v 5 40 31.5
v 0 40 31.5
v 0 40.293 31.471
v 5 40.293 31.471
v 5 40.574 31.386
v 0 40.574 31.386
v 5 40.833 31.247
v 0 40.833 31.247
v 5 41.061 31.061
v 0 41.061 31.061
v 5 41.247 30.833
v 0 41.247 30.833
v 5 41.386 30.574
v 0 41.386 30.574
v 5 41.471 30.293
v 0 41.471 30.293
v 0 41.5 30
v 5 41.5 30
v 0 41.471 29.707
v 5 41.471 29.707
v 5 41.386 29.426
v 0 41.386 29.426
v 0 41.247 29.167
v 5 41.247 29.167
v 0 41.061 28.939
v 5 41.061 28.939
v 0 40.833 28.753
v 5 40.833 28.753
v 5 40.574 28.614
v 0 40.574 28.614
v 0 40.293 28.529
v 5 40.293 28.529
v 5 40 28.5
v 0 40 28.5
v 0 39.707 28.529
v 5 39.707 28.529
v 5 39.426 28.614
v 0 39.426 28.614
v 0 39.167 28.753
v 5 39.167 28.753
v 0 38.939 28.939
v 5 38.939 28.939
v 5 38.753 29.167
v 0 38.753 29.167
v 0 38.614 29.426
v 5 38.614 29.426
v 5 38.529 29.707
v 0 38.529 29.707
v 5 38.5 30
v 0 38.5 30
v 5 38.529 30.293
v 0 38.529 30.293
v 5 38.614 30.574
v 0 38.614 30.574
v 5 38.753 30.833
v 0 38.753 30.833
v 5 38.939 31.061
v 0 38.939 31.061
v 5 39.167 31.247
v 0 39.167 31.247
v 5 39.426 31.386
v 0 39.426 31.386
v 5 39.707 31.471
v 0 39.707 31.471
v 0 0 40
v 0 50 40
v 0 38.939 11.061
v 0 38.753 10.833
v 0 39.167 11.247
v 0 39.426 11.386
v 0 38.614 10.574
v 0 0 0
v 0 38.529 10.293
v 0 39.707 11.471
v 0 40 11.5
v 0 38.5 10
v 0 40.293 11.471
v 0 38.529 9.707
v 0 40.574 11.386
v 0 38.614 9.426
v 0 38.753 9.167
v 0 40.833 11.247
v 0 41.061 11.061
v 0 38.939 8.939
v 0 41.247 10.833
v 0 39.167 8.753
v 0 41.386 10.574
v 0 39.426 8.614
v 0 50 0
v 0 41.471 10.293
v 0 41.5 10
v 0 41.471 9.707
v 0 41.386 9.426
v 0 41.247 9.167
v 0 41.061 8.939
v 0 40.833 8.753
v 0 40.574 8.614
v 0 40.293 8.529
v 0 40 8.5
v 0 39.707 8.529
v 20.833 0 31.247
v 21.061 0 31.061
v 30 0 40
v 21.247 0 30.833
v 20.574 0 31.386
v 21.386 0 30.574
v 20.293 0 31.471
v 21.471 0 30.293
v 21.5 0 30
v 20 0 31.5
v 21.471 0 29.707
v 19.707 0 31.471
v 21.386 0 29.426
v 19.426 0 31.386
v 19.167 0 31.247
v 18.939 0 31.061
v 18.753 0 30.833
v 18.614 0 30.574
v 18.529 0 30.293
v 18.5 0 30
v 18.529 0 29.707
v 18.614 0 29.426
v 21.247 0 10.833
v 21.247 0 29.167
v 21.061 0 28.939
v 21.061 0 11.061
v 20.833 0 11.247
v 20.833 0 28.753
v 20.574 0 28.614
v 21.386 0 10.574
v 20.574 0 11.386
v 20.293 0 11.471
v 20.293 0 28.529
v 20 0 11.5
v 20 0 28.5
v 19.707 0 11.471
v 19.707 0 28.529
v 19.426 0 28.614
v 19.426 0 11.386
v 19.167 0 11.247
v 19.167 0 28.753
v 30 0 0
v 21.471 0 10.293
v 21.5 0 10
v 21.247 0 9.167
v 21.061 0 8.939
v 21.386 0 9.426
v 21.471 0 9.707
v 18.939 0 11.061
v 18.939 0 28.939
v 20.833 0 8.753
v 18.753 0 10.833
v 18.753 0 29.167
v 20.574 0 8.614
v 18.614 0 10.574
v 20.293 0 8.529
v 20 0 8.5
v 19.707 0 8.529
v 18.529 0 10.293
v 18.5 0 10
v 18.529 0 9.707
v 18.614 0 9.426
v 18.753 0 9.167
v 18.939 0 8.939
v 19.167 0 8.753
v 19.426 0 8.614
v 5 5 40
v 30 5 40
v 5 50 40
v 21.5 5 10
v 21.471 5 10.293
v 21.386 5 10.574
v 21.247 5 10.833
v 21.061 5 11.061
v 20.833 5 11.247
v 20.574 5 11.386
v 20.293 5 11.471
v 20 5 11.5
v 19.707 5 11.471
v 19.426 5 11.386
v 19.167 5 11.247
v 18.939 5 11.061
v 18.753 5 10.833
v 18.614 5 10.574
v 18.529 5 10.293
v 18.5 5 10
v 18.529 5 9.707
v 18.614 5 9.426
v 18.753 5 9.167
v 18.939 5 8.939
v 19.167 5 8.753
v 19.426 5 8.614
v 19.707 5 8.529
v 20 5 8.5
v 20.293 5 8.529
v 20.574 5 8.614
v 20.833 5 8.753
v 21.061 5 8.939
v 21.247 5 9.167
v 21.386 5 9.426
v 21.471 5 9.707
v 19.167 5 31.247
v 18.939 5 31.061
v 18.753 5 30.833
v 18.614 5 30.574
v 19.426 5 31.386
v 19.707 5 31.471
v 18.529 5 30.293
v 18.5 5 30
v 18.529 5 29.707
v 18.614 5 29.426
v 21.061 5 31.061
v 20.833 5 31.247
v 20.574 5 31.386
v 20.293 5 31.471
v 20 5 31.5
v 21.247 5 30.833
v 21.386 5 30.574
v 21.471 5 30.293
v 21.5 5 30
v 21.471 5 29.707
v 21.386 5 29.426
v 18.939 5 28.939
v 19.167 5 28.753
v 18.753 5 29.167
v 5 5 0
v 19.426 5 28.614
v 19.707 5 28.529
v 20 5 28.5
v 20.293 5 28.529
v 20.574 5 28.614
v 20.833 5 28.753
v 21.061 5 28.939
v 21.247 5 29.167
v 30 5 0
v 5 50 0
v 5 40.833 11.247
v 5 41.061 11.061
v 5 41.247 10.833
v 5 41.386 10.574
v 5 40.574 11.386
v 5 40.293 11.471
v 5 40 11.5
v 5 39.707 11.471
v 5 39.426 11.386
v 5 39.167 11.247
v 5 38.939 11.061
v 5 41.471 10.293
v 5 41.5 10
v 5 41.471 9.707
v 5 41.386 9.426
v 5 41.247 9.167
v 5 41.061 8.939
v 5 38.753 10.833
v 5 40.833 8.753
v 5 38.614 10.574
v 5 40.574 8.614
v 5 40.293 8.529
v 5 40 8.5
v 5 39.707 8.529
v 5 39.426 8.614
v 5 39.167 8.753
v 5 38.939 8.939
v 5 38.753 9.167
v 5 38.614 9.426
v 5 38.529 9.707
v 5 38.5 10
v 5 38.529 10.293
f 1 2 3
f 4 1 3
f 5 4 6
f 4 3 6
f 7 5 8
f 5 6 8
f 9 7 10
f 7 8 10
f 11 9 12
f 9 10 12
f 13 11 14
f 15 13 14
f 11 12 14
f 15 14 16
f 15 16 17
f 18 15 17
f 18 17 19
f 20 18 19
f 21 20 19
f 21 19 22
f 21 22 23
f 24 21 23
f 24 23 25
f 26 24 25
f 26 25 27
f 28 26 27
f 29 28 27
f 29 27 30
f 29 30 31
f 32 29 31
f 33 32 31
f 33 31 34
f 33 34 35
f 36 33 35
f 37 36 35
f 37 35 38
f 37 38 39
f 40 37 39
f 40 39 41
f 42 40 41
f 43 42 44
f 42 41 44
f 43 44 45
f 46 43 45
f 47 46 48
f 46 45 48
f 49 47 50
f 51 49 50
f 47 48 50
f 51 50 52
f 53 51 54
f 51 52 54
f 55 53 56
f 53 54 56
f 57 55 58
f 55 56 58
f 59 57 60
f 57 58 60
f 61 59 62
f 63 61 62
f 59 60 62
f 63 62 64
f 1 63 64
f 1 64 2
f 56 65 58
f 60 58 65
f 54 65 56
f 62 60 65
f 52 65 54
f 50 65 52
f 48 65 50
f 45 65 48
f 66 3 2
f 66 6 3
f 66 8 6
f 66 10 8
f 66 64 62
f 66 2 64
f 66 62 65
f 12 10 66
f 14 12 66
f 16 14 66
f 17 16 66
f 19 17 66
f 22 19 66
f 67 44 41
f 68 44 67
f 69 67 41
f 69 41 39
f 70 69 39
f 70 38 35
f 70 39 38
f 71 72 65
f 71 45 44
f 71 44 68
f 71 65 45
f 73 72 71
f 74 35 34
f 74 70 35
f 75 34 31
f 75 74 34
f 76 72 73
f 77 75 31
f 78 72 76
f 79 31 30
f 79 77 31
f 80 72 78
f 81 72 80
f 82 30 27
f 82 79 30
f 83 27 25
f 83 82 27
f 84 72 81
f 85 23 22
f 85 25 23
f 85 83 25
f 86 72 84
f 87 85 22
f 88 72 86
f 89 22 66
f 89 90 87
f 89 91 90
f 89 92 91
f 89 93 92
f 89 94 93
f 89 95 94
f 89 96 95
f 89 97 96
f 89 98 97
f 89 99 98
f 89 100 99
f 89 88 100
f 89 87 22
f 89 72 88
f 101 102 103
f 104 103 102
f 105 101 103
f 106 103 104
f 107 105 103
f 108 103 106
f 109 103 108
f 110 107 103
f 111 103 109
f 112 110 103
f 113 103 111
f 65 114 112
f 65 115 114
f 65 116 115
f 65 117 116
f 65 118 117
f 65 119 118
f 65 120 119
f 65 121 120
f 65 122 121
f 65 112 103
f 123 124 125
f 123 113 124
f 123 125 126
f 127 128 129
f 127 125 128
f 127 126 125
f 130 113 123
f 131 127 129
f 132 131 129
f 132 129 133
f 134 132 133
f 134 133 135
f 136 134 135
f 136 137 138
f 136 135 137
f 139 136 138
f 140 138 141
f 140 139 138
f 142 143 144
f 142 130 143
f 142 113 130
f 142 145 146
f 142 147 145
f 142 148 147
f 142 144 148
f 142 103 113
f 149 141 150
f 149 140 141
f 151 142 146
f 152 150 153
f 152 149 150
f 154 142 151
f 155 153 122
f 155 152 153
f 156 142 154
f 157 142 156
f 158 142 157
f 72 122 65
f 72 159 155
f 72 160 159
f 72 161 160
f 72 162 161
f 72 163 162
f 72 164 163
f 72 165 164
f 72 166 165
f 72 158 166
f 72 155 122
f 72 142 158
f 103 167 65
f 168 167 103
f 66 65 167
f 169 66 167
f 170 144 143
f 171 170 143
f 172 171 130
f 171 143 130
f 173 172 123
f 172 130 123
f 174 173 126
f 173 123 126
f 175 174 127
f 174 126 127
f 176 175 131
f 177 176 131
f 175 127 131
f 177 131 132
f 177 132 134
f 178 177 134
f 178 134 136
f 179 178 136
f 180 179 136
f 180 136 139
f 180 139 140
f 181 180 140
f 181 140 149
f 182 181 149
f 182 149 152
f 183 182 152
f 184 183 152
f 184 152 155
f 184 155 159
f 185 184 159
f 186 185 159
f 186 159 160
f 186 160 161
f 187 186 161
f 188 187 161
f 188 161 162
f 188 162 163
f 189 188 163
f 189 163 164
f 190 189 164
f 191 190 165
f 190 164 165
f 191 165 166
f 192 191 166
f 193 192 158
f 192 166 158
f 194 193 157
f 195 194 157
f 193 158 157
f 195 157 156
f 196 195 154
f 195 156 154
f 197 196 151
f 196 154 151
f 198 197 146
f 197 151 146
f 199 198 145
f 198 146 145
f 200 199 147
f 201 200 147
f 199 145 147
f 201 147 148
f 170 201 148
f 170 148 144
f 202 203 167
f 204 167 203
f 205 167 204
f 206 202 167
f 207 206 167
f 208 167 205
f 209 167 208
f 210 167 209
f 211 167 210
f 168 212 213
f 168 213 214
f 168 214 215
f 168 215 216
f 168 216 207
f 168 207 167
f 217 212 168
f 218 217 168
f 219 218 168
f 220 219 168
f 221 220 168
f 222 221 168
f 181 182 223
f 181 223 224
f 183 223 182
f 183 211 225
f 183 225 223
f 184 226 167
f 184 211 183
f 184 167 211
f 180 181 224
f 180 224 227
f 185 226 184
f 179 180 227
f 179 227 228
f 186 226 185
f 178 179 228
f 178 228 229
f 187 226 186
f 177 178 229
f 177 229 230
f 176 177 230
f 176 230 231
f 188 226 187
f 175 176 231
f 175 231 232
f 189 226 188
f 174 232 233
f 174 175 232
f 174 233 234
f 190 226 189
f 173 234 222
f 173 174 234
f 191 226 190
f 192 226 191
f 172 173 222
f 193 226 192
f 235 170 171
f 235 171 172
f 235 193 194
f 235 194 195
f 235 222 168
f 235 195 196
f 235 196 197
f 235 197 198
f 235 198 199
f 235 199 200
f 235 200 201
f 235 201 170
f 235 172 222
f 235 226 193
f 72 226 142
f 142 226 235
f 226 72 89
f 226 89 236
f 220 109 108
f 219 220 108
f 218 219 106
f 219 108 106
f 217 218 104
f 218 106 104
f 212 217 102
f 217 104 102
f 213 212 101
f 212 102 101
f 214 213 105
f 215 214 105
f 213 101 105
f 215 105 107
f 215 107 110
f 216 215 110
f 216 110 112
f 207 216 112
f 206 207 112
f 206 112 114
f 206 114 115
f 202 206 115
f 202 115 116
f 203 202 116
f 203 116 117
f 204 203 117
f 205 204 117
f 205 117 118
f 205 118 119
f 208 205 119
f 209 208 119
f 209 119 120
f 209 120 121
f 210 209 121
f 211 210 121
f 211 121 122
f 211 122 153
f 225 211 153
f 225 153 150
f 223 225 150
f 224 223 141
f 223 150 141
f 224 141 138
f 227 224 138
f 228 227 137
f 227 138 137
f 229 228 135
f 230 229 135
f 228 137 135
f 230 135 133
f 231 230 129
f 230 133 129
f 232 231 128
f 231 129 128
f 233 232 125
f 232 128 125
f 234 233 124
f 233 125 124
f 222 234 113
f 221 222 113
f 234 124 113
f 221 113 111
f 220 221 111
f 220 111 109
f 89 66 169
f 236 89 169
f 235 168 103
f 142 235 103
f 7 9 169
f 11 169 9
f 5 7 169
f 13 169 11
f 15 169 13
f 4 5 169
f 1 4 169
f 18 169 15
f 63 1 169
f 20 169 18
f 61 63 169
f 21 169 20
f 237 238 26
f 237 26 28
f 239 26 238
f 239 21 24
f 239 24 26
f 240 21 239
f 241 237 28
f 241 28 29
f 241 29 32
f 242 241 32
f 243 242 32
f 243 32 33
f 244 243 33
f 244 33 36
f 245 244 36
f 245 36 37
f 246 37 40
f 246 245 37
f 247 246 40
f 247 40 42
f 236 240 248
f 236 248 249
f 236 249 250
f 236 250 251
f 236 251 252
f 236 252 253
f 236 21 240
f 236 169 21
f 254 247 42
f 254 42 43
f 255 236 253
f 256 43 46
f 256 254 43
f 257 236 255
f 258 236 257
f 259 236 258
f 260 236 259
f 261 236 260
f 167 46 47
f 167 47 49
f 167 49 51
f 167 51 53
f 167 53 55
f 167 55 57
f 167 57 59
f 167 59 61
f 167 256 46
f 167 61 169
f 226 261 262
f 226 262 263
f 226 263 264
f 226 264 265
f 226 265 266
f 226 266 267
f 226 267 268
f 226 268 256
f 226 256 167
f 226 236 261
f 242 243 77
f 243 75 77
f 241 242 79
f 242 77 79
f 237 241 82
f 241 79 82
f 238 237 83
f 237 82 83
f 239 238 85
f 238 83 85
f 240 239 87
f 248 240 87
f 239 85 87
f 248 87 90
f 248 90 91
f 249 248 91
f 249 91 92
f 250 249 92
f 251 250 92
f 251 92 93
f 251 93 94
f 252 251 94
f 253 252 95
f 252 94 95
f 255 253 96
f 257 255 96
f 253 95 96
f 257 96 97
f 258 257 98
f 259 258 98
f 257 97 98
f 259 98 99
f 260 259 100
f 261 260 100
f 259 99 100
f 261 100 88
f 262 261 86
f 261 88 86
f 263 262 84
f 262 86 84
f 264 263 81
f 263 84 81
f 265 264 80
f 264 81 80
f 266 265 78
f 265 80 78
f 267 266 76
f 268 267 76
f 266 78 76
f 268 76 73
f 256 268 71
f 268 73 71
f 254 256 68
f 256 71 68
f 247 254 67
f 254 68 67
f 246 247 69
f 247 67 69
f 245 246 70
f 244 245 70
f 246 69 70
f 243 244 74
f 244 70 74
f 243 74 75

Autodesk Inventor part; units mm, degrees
ref_plane "YZ Plane" through (0, 0, 0) normal (1, 0, 0) x (0, 1, 0)
ref_plane "XZ Plane" through (0, 0, 0) normal (0, 1, 0) x (-1, 0, 0)
ref_plane "XY Plane" through (0, 0, 0) normal (0, 0, 1) x (1, 0, 0)
sketch "Sketch1" plane through (0, 0, 0) normal (0, 0, 1) x (1, 0, 0)
  line L0 (0, 0) -> (0, 50)
  line L1 (0, 50) -> (5, 50)
  line L2 (5, 50) -> (5, 5)
  line L3 (5, 5) -> (30, 5)
  line L4 (30, 5) -> (30, 0)
  line L5 (30, 0) -> (0, 0)
  dimension "d0" = 50
  dimension "d1" = 5
  dimension "d2" = 45
  dimension "d3" = 25
  dimension "d4" = 5
extrude "Extrusion1" add sketch "Sketch1" along normal blind 40
sketch "Sketch2" plane through (0, 0, 0) normal (-1, 0, 0) x (0, 0, 1)
  circle A0 centre (10, 40) radius 1.5
  circle A1 centre (30, 40) radius 1.5
  point P0 (0, 0)
  dimension "d7" = 3
  dimension "d8" = 3
sketch "Sketch3" plane through (0, 0, 0) normal (-1, 0, 0) x (0, 0, 1)
  point P0 (0, 0)
extrude "Extrusion2" cut sketch "Sketch2" against normal through all
sketch "Sketch4" plane through (5, 5, 0) normal (0, 1, 0) x (1, 0, 0)
  point P0 (-5, 0)
sketch "Sketch5" plane through (0, 0, 0) normal (0, -1, 0) x (1, 0, 0)
  circle A0 centre (20, 30) radius 1.5
  circle A1 centre (20, 10) radius 1.5
  point P0 (0, 0)
  dimension "d11" = 3
  dimension "d12" = 3
extrude "Extrusion3" cut sketch "Sketch5" against normal through all
properties part number "moter support"
